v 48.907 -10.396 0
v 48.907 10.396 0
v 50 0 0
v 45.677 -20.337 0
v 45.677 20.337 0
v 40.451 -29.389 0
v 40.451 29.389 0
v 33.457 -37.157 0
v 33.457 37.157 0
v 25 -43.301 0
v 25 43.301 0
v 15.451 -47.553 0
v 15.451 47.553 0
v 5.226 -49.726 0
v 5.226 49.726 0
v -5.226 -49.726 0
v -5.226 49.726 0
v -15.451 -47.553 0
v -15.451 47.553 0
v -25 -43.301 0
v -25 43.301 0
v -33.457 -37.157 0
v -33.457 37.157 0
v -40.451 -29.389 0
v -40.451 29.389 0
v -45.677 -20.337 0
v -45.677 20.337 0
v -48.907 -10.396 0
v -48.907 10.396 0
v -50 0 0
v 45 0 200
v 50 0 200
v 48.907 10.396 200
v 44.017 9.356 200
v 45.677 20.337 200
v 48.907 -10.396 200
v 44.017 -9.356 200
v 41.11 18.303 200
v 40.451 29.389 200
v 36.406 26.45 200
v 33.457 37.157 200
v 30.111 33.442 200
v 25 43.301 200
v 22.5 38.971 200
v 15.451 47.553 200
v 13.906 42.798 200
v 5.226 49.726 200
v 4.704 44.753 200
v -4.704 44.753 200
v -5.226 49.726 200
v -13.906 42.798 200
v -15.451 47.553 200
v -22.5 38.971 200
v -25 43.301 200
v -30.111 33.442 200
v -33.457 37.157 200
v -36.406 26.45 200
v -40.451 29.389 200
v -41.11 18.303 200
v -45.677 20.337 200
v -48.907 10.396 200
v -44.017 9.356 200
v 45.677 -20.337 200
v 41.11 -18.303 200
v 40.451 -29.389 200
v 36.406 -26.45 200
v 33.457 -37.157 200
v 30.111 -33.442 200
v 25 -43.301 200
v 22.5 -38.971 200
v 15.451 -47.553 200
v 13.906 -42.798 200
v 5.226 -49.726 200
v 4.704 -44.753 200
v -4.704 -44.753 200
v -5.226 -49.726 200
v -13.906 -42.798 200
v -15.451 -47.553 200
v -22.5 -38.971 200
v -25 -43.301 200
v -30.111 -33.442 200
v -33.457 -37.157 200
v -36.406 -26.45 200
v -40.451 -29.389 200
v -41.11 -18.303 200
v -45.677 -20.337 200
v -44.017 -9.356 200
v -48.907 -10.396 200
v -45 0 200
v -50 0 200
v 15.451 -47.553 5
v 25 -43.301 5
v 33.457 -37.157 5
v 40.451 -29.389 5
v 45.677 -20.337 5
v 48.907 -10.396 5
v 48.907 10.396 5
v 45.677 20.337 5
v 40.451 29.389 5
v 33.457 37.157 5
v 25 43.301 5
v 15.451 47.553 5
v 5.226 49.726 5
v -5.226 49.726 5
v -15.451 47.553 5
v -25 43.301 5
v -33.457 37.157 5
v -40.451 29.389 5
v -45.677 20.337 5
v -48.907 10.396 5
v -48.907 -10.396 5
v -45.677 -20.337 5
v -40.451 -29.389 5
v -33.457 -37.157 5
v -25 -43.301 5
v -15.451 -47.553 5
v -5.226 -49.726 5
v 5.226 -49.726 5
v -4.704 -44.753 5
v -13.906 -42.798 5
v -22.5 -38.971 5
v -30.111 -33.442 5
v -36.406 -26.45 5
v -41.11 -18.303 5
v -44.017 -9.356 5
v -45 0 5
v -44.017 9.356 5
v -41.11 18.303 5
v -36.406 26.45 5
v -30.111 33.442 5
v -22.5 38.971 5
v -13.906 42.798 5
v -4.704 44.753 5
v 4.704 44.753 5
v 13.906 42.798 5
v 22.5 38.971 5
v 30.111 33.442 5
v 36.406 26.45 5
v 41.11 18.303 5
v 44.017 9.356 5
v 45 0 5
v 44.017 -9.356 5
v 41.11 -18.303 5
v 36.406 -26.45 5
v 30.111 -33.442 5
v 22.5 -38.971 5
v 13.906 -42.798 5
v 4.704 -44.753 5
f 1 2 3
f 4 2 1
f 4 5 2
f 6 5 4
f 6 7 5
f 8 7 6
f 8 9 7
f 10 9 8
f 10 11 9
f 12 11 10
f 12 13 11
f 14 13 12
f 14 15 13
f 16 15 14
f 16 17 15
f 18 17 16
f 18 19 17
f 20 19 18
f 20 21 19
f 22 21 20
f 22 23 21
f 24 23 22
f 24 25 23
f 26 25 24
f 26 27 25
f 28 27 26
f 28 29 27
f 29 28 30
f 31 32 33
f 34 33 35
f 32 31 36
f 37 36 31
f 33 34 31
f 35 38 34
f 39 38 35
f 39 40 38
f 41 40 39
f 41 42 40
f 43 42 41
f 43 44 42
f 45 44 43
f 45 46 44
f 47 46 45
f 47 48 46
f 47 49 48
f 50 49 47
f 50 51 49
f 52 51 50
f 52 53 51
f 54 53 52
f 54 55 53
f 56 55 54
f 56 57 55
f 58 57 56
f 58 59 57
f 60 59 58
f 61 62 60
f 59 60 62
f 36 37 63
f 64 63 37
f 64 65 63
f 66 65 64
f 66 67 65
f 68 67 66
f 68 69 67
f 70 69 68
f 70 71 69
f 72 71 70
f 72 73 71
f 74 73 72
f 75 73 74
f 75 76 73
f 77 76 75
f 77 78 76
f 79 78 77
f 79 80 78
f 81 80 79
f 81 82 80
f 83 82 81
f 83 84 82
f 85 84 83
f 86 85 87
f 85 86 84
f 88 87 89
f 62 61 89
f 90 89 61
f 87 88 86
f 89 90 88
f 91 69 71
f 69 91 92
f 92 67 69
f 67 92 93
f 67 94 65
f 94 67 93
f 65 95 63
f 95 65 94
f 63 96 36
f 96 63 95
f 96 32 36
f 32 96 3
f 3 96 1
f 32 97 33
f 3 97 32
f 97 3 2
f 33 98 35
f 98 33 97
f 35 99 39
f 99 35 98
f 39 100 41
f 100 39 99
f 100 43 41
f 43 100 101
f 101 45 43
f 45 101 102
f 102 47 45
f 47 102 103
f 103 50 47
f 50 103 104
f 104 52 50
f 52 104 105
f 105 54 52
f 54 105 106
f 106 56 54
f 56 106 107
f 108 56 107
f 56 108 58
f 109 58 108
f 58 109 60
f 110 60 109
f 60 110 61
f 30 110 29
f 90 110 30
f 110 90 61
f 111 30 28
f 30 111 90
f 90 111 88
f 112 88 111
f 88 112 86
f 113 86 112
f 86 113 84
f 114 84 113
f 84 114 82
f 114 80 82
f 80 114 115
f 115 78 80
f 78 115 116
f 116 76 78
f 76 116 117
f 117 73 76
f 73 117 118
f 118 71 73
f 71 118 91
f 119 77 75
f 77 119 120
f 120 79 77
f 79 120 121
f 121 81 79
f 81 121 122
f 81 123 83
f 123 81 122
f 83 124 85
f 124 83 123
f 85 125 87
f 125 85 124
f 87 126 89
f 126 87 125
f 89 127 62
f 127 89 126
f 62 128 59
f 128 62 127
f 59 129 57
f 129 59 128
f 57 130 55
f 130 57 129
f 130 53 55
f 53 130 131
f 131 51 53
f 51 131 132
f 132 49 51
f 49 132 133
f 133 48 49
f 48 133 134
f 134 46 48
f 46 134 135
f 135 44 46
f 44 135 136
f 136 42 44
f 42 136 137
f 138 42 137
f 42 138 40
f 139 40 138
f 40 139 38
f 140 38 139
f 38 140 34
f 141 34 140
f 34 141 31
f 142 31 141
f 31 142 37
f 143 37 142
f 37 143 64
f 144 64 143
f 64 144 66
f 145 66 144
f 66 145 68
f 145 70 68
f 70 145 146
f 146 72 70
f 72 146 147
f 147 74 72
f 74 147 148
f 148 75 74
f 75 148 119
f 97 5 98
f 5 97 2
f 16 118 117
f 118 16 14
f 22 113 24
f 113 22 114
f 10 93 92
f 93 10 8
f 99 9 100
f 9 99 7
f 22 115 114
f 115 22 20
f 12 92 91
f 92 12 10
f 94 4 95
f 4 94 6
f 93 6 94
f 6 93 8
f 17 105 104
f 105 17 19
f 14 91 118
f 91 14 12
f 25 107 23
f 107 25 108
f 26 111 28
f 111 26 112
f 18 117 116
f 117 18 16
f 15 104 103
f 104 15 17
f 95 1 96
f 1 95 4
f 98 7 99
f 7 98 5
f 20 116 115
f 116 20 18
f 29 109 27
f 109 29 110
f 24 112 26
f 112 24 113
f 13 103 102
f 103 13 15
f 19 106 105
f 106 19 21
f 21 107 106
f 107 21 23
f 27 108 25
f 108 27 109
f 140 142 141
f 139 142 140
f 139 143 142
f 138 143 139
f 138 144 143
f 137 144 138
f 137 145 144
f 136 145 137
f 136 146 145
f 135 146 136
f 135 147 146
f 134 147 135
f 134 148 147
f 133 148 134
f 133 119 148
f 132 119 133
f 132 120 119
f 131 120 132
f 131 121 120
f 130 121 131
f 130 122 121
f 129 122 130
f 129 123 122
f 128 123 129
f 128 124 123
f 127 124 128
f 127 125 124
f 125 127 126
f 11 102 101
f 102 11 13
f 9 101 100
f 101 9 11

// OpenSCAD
module glass(radius, thickness) {
  union() {
    linear_extrude(height=200) {
      difference() {
        circle(radius);
        circle(radius - thickness);
      }
    }
    linear_extrude(height=thickness) {
      circle(radius);
    }
  }
}

glass(radius = 50, thickness = 5);
